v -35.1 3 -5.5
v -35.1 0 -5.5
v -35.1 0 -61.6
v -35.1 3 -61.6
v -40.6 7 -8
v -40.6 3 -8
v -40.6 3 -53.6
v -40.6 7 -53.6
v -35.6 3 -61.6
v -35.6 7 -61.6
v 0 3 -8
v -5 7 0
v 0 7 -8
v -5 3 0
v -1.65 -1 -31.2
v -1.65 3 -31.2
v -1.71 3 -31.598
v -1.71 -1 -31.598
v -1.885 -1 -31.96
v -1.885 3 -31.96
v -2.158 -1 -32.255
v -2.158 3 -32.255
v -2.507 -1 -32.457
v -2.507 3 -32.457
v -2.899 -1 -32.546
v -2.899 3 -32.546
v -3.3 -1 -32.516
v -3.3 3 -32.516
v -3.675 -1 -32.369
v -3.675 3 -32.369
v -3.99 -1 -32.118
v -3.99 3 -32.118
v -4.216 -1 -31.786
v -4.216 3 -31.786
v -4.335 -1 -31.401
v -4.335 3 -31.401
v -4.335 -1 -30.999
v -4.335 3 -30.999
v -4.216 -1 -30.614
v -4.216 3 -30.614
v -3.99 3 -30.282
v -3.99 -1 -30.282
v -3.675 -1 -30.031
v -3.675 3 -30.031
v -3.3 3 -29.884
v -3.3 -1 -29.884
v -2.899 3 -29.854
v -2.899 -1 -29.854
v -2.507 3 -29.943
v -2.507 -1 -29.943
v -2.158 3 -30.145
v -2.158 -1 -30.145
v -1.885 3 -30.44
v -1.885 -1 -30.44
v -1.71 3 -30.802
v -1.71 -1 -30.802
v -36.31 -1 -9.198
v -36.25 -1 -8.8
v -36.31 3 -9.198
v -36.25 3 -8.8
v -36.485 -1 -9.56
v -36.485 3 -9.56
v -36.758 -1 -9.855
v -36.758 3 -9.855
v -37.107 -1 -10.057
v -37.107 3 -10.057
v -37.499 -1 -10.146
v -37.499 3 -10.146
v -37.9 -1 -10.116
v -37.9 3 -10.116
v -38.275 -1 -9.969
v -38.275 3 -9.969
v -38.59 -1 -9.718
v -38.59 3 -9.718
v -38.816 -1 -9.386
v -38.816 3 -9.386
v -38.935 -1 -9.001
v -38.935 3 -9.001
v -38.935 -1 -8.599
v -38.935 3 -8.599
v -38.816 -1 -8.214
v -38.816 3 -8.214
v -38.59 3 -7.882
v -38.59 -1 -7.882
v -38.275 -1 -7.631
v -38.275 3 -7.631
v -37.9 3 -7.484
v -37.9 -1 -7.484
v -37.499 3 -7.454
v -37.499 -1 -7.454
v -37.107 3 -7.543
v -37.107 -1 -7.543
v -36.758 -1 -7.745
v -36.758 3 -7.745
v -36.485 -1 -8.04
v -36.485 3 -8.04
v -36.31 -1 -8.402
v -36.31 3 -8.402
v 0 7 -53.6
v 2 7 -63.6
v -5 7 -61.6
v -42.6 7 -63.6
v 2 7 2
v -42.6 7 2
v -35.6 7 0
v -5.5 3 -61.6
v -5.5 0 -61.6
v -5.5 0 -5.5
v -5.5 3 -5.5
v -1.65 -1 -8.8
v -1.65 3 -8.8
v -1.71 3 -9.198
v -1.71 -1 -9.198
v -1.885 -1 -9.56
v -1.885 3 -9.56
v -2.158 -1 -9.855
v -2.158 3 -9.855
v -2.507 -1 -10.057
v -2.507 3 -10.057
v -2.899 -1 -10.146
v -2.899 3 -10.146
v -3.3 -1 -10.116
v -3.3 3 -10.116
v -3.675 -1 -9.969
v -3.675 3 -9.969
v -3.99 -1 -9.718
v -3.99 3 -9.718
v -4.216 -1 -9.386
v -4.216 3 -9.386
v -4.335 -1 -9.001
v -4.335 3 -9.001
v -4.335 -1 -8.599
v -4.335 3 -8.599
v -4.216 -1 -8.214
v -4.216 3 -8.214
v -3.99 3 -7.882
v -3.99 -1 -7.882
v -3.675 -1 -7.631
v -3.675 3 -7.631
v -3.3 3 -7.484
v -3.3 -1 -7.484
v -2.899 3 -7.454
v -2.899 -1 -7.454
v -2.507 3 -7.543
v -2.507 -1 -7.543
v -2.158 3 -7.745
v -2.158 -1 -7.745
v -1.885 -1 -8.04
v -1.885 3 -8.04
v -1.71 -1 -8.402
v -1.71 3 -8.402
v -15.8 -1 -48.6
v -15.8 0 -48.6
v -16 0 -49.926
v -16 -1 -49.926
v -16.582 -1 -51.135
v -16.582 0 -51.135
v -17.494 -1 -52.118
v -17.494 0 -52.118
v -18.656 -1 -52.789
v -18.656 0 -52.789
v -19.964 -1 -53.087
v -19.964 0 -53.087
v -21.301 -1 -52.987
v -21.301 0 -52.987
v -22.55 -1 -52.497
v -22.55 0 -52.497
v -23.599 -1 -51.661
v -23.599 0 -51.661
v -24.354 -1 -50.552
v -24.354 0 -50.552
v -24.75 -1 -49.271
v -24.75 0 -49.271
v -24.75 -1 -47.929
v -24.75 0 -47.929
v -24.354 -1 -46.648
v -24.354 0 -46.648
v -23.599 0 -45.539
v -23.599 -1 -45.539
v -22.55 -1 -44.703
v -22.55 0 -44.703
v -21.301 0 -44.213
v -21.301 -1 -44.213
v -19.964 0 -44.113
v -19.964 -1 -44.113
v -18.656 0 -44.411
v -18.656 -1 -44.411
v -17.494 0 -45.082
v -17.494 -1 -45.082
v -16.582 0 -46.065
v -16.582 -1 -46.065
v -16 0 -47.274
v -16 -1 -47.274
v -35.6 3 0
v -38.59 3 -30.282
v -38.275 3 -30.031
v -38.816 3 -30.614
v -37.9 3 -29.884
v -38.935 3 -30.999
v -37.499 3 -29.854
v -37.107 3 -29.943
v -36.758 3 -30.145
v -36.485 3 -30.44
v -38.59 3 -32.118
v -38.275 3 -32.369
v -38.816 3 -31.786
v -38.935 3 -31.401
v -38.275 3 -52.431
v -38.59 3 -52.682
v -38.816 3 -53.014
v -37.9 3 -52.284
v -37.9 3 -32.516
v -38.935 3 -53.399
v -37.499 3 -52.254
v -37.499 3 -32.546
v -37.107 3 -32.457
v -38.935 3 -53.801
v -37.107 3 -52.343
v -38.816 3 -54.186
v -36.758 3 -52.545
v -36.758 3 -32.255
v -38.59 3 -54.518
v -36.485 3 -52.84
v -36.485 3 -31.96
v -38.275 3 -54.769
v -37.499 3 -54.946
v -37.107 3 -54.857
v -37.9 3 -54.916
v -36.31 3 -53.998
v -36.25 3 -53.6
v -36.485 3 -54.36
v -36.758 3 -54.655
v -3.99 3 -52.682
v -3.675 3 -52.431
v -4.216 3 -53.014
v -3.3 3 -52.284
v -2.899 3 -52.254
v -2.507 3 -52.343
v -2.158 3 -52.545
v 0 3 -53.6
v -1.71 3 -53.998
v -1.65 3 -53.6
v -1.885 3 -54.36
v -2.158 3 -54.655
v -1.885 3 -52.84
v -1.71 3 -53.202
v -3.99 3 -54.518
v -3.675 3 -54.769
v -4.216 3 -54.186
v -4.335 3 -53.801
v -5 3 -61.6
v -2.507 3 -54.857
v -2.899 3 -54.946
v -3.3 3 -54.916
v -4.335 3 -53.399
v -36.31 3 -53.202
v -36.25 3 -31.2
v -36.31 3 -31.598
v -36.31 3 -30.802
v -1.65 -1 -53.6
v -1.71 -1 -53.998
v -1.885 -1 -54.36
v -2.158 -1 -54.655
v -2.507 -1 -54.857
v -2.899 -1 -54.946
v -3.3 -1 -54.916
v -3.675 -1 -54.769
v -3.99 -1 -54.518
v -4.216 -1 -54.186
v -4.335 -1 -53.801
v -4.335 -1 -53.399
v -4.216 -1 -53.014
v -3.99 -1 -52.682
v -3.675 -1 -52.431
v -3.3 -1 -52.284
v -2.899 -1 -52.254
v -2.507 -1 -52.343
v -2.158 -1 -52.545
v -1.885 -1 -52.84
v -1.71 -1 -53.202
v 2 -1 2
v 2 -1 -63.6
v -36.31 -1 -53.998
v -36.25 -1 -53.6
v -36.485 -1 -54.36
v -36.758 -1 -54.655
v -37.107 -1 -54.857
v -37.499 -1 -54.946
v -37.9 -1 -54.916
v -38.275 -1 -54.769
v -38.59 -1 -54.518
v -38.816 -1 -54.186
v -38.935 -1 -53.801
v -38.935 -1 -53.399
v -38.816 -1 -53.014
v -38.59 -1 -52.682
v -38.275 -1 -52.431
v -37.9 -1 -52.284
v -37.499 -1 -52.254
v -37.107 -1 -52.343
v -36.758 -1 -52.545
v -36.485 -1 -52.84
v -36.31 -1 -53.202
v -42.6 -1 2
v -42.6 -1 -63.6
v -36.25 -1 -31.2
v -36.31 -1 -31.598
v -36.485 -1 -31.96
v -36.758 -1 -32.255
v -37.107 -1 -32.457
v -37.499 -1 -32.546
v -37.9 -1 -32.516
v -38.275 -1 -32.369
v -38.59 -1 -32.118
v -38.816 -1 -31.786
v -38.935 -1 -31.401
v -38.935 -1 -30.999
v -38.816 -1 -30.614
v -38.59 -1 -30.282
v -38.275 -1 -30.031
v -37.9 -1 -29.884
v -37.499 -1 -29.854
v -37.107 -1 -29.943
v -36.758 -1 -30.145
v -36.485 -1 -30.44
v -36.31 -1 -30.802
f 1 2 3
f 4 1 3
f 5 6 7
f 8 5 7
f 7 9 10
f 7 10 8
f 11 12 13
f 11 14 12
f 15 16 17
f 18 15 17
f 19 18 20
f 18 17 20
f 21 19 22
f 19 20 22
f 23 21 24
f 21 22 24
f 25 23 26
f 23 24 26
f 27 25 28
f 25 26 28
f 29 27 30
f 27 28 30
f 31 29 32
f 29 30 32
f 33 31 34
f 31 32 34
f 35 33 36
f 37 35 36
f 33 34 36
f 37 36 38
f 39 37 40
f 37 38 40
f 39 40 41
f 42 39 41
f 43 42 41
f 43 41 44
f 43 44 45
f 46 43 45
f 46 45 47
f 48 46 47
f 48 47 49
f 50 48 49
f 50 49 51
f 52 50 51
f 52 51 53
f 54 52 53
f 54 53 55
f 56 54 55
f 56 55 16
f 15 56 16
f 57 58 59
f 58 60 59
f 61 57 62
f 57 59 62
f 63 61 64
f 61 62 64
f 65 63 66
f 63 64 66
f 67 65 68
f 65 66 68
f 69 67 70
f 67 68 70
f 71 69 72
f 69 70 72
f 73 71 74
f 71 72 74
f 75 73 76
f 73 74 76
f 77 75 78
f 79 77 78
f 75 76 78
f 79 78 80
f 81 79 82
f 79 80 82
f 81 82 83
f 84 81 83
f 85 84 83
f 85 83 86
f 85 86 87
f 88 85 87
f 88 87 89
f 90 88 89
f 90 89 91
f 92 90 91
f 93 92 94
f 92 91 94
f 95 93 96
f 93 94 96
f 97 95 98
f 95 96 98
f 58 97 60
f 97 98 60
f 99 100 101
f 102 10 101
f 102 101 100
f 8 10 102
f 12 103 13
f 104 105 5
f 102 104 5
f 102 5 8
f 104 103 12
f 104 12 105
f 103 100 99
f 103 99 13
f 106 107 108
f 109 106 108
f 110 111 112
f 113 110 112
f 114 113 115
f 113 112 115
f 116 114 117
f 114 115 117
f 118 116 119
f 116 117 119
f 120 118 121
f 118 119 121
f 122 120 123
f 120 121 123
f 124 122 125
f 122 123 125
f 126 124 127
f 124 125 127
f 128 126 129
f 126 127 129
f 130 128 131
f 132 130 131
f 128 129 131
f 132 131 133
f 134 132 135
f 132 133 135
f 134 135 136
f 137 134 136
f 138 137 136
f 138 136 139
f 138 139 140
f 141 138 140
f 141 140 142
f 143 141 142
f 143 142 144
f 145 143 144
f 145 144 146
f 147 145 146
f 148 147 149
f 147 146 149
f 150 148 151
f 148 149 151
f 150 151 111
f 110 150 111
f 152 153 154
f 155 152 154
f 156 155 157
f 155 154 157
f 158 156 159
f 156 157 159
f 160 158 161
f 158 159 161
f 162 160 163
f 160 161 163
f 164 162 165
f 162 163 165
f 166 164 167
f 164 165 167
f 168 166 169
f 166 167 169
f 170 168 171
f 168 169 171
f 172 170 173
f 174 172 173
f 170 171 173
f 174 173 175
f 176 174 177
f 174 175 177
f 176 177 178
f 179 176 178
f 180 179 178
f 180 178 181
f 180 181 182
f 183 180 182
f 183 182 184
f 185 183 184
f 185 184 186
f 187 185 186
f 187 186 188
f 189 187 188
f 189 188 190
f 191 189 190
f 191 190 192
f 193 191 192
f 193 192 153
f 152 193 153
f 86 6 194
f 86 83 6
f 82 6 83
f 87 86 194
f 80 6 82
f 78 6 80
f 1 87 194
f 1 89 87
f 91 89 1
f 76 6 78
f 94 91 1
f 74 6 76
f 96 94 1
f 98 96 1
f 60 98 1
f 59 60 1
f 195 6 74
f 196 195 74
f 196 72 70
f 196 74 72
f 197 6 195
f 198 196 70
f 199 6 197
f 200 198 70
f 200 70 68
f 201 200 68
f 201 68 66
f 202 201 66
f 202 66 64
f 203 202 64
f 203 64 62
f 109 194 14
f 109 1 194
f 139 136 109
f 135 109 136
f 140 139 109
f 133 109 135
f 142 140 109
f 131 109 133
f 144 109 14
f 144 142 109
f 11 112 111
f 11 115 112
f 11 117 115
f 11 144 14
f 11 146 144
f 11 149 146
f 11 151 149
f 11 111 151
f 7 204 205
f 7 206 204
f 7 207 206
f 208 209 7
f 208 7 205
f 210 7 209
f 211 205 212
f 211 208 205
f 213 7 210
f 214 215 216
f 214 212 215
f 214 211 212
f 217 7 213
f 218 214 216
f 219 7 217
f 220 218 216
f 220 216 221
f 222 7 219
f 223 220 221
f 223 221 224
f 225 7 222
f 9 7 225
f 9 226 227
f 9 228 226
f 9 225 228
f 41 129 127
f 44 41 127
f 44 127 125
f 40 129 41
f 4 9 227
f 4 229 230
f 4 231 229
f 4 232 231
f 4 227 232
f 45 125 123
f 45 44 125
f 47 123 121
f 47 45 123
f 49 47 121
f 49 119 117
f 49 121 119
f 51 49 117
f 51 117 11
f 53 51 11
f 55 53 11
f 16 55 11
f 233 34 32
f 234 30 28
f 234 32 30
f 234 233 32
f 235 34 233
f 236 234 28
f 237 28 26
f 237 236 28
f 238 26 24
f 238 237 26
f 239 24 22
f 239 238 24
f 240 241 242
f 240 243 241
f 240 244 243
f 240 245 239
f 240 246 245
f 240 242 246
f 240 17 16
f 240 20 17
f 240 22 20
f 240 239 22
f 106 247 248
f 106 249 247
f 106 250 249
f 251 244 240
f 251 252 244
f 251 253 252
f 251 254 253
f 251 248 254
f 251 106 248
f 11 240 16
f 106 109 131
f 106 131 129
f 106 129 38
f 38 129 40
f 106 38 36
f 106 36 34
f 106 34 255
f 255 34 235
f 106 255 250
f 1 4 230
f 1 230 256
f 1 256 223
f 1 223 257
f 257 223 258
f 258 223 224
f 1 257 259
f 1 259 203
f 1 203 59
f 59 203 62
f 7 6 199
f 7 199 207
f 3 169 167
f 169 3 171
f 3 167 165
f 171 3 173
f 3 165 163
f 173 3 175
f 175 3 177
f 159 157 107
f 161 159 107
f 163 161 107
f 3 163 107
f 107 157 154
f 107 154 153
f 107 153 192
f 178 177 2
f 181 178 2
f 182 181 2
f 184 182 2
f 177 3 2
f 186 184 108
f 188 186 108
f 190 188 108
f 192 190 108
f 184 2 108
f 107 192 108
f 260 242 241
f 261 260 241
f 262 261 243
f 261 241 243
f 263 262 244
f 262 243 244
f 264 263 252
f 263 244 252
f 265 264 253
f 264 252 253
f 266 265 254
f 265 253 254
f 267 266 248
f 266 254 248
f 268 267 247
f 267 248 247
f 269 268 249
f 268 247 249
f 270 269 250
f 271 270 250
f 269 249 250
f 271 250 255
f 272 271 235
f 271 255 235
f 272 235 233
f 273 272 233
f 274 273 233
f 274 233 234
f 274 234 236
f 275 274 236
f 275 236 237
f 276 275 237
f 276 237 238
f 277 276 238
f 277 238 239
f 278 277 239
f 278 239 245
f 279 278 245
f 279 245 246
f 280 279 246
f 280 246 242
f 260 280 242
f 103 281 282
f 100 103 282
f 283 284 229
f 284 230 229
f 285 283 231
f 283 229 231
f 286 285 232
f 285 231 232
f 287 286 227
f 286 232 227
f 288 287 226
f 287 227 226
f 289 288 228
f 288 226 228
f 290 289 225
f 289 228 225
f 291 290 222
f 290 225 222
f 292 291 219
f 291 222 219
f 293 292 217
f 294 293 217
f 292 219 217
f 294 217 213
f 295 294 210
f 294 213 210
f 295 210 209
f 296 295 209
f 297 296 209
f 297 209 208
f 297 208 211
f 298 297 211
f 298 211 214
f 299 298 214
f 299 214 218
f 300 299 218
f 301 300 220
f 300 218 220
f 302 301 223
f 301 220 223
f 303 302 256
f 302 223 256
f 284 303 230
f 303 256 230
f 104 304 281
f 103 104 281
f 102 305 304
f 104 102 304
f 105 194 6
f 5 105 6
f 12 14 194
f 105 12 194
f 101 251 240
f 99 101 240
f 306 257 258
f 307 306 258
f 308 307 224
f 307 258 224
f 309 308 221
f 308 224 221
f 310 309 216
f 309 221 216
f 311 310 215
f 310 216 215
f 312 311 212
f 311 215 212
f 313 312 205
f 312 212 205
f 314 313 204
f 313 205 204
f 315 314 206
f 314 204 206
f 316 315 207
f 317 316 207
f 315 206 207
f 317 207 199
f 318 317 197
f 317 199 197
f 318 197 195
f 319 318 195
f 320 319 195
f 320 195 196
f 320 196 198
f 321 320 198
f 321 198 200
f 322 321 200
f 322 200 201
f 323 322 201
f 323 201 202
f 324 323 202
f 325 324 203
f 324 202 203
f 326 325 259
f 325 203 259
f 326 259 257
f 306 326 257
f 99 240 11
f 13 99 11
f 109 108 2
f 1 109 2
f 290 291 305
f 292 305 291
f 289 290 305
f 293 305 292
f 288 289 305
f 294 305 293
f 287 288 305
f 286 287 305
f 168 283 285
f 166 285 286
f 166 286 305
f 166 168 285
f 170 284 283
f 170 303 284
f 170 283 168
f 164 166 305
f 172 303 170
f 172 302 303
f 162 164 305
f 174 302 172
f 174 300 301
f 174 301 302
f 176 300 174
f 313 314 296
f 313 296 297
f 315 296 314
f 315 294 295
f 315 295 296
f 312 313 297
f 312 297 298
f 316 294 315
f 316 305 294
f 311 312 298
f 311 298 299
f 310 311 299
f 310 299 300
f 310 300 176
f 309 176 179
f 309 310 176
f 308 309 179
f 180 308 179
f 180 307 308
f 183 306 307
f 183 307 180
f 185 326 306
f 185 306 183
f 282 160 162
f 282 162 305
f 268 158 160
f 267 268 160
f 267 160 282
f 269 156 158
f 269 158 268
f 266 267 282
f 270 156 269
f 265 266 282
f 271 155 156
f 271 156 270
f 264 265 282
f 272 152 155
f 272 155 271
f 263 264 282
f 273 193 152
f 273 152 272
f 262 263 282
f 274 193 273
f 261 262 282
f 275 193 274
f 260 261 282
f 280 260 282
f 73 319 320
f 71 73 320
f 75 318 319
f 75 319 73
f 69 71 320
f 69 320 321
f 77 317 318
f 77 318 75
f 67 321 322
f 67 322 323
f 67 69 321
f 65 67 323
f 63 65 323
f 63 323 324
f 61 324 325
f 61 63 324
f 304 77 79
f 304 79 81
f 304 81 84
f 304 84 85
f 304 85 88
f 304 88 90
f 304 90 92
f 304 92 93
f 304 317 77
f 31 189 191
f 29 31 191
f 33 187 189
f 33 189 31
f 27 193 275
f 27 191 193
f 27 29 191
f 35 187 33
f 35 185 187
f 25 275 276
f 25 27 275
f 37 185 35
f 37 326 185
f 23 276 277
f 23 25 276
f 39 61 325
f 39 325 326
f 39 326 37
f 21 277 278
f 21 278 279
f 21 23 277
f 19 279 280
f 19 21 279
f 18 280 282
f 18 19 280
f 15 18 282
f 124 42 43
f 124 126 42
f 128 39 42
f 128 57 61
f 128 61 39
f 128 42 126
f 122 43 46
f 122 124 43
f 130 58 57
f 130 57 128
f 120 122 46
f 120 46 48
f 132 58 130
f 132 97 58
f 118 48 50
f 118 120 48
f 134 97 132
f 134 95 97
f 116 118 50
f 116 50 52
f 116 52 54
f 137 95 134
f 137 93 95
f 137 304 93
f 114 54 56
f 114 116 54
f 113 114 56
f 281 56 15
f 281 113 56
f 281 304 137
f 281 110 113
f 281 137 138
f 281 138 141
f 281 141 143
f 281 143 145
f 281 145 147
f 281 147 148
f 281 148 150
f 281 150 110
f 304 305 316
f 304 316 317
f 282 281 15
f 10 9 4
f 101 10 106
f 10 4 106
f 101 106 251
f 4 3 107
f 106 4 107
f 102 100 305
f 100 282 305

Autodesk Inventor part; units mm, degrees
ref_plane "YZ Plane" through (0, 0, 0) normal (1, 0, 0) x (0, 1, 0)
ref_plane "XZ Plane" through (0, 0, 0) normal (0, 1, 0) x (-1, 0, 0)
ref_plane "XY Plane" through (0, 0, 0) normal (0, 0, 1) x (1, 0, 0)
sketch "스케치1" plane through (0, 0, 0) normal (0, 1, 0) x (-1, 0, 0)
  line L0 (0, 0) -> (40.6, 0)
  line L1 (40.6, 0) -> (40.6, -61.6)
  line L2 (40.6, -61.6) -> (0, -61.6)
  line L3 (0, -61.6) -> (0, 0)
  line L4 (42.6, -63.6) -> (42.6, 2)
  line L5 (42.6, 2) -> (-2, 2)
  line L6 (-2, 2) -> (-2, -63.6)
  line L7 (-2, -63.6) -> (42.6, -63.6)
  line L8 (35.6, 0) -> (40.6, -8)
  line L9 (40.6, -30.8) -> (0, -30.8) construction
  line L10 (20.3, 0) -> (20.3, -61.6) construction
  line L11 (35.6, -61.6) -> (40.6, -53.6)
  line L12 (0, 0) -> (0, -61.6)
  line L13 (5, 0) -> (0, -8)
  line L14 (5, -61.6) -> (0, -53.6)
  point P0 (0, -8)
  point P1 (5, 0)
  point P2 (40.6, -53.6)
  point P3 (0, -53.6)
  dimension "d0" = 40.6
  dimension "d1" = 61.6
  dimension "d2" = 2
  dimension "d3" = 5
  dimension "d4" = 8
extrude "돌출1" add sketch "스케치1" along normal blind 7 contours L0 L13 L3 | L0 L1 L8 | L14 L2 L3 | L1 L2 L11 | L7 L6 L5 L4
sketch "스케치2" plane through (0, 0, 0) normal (0, -1, 0) x (1, 0, 0)
  line L0 (-42.6, 2) -> (2, 2) projected
  line L1 (-42.6, -63.6) -> (-42.6, 2) projected
  line L2 (2, -63.6) -> (-42.6, -63.6) projected
  line L3 (2, 2) -> (2, -63.6) projected
  line L4 (0, -53.6) -> (0, -8) projected
  line L5 (-5, -61.6) -> (0, -53.6) projected
  line L6 (-35.6, -61.6) -> (-5, -61.6) projected
  line L7 (-40.6, -53.6) -> (-35.6, -61.6) projected
  line L8 (-40.6, -8) -> (-40.6, -53.6) projected
  line L9 (-35.6, 0) -> (-40.6, -8) projected
  line L10 (-5, 0) -> (-35.6, 0) projected
  line L11 (0, -8) -> (-5, 0) projected
  point P0 (0, 0)
extrude "돌출2" add sketch "스케치2" along normal blind 1 contours L0 L3 L2 L1 | L5 L6 L7 L8 L9 L10 L11 L4
sketch "스케치3" plane through (0, 0, 0) normal (0, 1, 0) x (1, 0, 0)
  line L0 (-42.6, -2) -> (2, -2) projected
  line L1 (2, -2) -> (2, 63.6) projected
  line L2 (2, 63.6) -> (-42.6, 63.6) projected
  line L3 (-42.6, 63.6) -> (-42.6, -2) projected
  line L4 (0, 53.6) -> (0, 8) projected
  line L5 (0, 8) -> (-5, 0) projected
  line L6 (-5, 0) -> (-35.6, 0) projected
  line L7 (-35.6, 0) -> (-40.6, 8) projected
  line L8 (-40.6, 8) -> (-40.6, 53.6) projected
  line L9 (-40.6, 53.6) -> (-35.6, 61.6) projected
  line L10 (-35.6, 61.6) -> (-5, 61.6) projected
  line L11 (-5, 61.6) -> (0, 53.6) projected
  line L12 (-35.1, 61.6) -> (-5.5, 61.6)
  line L13 (-5.5, 61.6) -> (-5.5, 5.5)
  line L14 (-5.5, 5.5) -> (-35.1, 5.5)
  line L15 (-35.1, 5.5) -> (-35.1, 61.6)
  line L16 (-35.6, 61.6) -> (-5, 61.6) projected
  point P0 (0, 0)
  dimension "d9" = 5.5
  dimension "d10" = 5.5
  dimension "d11" = 5.5
extrude "돌출3" add sketch "스케치3" along normal blind 3 contours L4 L5 L6 L7 L8 L9 L10 L15 L14 L13 L11
sketch "스케치4" plane through (0, 0, 0) normal (0, 1, 0) x (1, 0, 0)
  line L0 (-5.5, 5.5) -> (-5.5, 61.6) projected
  line L1 (-35.1, 61.6) -> (-5.5, 61.6) projected
  line L2 (-35.1, 61.6) -> (-35.1, 5.5) projected
  line L3 (-35.1, 5.5) -> (-5.5, 5.5) projected
  circle A0 centre (-20.3, 48.6) radius 4.5
  point P0 (0, 0)
  dimension "d15" = 9
  dimension "d18" = 13
extrude "돌출4" cut sketch "스케치4" against normal blind 7 contours A0
sketch "스케치5" plane through (0, 3, 0) normal (0, 1, 0) x (1, 0, 0)
  line L0 (-42.6, -2) -> (2, -2) projected
  line L1 (-40.6, 8) -> (-40.6, 53.6) projected
  line L2 (-35.6, 0) -> (-40.6, 8) projected
  line L3 (-5, 0) -> (-35.6, 0) projected
  line L4 (0, 8) -> (-5, 0) projected
  line L5 (0, 53.6) -> (0, 8) projected
  line L6 (-5, 61.6) -> (0, 53.6) projected
  line L7 (-5.5, 61.6) -> (-5, 61.6) projected
  line L8 (-5.5, 61.6) -> (-5.5, 5.5) projected
  line L9 (-5.5, 5.5) -> (-35.1, 5.5) projected
  line L10 (-35.1, 5.5) -> (-35.1, 61.6) projected
  line L11 (-35.6, 61.6) -> (-35.1, 61.6) projected
  line L12 (-40.6, 53.6) -> (-35.6, 61.6) projected
  line L13 (-37.6, 4.5) -> (-37.6, 58.8776) construction
  circle A0 centre (-37.6, 53.6) radius 1.35
  line L14 (2, 63.6) -> (-42.6, 63.6) construction
  circle A1 centre (-37.6, 31.2) radius 1.35
  circle A2 centre (-37.6, 8.8) radius 1.35
  line L15 (-20.3, 5.5) -> (-20.3, 61.6) construction
  line L16 (-35.6, 61.6) -> (-5, 61.6) construction
  line L17 (-5, 0) -> (0, 8)
  line L18 (-5.5, 5.5) -> (-5.5, 61.6)
  circle A3 centre (-3, 53.6) radius 1.35
  circle A4 centre (-3, 31.2) radius 1.35
  circle A5 centre (-3, 8.8) radius 1.35
  point P0 (0, 0)
  dimension "d20" = 2.7
  dimension "d21" = 10
  dimension "d24" = 22.4
  dimension "d31" = 34.6
extrude "돌출5" cut sketch "스케치5" against normal through all contours A0 | A1 | A2 | A3 | A4 | A5
properties part number "mx-64"
